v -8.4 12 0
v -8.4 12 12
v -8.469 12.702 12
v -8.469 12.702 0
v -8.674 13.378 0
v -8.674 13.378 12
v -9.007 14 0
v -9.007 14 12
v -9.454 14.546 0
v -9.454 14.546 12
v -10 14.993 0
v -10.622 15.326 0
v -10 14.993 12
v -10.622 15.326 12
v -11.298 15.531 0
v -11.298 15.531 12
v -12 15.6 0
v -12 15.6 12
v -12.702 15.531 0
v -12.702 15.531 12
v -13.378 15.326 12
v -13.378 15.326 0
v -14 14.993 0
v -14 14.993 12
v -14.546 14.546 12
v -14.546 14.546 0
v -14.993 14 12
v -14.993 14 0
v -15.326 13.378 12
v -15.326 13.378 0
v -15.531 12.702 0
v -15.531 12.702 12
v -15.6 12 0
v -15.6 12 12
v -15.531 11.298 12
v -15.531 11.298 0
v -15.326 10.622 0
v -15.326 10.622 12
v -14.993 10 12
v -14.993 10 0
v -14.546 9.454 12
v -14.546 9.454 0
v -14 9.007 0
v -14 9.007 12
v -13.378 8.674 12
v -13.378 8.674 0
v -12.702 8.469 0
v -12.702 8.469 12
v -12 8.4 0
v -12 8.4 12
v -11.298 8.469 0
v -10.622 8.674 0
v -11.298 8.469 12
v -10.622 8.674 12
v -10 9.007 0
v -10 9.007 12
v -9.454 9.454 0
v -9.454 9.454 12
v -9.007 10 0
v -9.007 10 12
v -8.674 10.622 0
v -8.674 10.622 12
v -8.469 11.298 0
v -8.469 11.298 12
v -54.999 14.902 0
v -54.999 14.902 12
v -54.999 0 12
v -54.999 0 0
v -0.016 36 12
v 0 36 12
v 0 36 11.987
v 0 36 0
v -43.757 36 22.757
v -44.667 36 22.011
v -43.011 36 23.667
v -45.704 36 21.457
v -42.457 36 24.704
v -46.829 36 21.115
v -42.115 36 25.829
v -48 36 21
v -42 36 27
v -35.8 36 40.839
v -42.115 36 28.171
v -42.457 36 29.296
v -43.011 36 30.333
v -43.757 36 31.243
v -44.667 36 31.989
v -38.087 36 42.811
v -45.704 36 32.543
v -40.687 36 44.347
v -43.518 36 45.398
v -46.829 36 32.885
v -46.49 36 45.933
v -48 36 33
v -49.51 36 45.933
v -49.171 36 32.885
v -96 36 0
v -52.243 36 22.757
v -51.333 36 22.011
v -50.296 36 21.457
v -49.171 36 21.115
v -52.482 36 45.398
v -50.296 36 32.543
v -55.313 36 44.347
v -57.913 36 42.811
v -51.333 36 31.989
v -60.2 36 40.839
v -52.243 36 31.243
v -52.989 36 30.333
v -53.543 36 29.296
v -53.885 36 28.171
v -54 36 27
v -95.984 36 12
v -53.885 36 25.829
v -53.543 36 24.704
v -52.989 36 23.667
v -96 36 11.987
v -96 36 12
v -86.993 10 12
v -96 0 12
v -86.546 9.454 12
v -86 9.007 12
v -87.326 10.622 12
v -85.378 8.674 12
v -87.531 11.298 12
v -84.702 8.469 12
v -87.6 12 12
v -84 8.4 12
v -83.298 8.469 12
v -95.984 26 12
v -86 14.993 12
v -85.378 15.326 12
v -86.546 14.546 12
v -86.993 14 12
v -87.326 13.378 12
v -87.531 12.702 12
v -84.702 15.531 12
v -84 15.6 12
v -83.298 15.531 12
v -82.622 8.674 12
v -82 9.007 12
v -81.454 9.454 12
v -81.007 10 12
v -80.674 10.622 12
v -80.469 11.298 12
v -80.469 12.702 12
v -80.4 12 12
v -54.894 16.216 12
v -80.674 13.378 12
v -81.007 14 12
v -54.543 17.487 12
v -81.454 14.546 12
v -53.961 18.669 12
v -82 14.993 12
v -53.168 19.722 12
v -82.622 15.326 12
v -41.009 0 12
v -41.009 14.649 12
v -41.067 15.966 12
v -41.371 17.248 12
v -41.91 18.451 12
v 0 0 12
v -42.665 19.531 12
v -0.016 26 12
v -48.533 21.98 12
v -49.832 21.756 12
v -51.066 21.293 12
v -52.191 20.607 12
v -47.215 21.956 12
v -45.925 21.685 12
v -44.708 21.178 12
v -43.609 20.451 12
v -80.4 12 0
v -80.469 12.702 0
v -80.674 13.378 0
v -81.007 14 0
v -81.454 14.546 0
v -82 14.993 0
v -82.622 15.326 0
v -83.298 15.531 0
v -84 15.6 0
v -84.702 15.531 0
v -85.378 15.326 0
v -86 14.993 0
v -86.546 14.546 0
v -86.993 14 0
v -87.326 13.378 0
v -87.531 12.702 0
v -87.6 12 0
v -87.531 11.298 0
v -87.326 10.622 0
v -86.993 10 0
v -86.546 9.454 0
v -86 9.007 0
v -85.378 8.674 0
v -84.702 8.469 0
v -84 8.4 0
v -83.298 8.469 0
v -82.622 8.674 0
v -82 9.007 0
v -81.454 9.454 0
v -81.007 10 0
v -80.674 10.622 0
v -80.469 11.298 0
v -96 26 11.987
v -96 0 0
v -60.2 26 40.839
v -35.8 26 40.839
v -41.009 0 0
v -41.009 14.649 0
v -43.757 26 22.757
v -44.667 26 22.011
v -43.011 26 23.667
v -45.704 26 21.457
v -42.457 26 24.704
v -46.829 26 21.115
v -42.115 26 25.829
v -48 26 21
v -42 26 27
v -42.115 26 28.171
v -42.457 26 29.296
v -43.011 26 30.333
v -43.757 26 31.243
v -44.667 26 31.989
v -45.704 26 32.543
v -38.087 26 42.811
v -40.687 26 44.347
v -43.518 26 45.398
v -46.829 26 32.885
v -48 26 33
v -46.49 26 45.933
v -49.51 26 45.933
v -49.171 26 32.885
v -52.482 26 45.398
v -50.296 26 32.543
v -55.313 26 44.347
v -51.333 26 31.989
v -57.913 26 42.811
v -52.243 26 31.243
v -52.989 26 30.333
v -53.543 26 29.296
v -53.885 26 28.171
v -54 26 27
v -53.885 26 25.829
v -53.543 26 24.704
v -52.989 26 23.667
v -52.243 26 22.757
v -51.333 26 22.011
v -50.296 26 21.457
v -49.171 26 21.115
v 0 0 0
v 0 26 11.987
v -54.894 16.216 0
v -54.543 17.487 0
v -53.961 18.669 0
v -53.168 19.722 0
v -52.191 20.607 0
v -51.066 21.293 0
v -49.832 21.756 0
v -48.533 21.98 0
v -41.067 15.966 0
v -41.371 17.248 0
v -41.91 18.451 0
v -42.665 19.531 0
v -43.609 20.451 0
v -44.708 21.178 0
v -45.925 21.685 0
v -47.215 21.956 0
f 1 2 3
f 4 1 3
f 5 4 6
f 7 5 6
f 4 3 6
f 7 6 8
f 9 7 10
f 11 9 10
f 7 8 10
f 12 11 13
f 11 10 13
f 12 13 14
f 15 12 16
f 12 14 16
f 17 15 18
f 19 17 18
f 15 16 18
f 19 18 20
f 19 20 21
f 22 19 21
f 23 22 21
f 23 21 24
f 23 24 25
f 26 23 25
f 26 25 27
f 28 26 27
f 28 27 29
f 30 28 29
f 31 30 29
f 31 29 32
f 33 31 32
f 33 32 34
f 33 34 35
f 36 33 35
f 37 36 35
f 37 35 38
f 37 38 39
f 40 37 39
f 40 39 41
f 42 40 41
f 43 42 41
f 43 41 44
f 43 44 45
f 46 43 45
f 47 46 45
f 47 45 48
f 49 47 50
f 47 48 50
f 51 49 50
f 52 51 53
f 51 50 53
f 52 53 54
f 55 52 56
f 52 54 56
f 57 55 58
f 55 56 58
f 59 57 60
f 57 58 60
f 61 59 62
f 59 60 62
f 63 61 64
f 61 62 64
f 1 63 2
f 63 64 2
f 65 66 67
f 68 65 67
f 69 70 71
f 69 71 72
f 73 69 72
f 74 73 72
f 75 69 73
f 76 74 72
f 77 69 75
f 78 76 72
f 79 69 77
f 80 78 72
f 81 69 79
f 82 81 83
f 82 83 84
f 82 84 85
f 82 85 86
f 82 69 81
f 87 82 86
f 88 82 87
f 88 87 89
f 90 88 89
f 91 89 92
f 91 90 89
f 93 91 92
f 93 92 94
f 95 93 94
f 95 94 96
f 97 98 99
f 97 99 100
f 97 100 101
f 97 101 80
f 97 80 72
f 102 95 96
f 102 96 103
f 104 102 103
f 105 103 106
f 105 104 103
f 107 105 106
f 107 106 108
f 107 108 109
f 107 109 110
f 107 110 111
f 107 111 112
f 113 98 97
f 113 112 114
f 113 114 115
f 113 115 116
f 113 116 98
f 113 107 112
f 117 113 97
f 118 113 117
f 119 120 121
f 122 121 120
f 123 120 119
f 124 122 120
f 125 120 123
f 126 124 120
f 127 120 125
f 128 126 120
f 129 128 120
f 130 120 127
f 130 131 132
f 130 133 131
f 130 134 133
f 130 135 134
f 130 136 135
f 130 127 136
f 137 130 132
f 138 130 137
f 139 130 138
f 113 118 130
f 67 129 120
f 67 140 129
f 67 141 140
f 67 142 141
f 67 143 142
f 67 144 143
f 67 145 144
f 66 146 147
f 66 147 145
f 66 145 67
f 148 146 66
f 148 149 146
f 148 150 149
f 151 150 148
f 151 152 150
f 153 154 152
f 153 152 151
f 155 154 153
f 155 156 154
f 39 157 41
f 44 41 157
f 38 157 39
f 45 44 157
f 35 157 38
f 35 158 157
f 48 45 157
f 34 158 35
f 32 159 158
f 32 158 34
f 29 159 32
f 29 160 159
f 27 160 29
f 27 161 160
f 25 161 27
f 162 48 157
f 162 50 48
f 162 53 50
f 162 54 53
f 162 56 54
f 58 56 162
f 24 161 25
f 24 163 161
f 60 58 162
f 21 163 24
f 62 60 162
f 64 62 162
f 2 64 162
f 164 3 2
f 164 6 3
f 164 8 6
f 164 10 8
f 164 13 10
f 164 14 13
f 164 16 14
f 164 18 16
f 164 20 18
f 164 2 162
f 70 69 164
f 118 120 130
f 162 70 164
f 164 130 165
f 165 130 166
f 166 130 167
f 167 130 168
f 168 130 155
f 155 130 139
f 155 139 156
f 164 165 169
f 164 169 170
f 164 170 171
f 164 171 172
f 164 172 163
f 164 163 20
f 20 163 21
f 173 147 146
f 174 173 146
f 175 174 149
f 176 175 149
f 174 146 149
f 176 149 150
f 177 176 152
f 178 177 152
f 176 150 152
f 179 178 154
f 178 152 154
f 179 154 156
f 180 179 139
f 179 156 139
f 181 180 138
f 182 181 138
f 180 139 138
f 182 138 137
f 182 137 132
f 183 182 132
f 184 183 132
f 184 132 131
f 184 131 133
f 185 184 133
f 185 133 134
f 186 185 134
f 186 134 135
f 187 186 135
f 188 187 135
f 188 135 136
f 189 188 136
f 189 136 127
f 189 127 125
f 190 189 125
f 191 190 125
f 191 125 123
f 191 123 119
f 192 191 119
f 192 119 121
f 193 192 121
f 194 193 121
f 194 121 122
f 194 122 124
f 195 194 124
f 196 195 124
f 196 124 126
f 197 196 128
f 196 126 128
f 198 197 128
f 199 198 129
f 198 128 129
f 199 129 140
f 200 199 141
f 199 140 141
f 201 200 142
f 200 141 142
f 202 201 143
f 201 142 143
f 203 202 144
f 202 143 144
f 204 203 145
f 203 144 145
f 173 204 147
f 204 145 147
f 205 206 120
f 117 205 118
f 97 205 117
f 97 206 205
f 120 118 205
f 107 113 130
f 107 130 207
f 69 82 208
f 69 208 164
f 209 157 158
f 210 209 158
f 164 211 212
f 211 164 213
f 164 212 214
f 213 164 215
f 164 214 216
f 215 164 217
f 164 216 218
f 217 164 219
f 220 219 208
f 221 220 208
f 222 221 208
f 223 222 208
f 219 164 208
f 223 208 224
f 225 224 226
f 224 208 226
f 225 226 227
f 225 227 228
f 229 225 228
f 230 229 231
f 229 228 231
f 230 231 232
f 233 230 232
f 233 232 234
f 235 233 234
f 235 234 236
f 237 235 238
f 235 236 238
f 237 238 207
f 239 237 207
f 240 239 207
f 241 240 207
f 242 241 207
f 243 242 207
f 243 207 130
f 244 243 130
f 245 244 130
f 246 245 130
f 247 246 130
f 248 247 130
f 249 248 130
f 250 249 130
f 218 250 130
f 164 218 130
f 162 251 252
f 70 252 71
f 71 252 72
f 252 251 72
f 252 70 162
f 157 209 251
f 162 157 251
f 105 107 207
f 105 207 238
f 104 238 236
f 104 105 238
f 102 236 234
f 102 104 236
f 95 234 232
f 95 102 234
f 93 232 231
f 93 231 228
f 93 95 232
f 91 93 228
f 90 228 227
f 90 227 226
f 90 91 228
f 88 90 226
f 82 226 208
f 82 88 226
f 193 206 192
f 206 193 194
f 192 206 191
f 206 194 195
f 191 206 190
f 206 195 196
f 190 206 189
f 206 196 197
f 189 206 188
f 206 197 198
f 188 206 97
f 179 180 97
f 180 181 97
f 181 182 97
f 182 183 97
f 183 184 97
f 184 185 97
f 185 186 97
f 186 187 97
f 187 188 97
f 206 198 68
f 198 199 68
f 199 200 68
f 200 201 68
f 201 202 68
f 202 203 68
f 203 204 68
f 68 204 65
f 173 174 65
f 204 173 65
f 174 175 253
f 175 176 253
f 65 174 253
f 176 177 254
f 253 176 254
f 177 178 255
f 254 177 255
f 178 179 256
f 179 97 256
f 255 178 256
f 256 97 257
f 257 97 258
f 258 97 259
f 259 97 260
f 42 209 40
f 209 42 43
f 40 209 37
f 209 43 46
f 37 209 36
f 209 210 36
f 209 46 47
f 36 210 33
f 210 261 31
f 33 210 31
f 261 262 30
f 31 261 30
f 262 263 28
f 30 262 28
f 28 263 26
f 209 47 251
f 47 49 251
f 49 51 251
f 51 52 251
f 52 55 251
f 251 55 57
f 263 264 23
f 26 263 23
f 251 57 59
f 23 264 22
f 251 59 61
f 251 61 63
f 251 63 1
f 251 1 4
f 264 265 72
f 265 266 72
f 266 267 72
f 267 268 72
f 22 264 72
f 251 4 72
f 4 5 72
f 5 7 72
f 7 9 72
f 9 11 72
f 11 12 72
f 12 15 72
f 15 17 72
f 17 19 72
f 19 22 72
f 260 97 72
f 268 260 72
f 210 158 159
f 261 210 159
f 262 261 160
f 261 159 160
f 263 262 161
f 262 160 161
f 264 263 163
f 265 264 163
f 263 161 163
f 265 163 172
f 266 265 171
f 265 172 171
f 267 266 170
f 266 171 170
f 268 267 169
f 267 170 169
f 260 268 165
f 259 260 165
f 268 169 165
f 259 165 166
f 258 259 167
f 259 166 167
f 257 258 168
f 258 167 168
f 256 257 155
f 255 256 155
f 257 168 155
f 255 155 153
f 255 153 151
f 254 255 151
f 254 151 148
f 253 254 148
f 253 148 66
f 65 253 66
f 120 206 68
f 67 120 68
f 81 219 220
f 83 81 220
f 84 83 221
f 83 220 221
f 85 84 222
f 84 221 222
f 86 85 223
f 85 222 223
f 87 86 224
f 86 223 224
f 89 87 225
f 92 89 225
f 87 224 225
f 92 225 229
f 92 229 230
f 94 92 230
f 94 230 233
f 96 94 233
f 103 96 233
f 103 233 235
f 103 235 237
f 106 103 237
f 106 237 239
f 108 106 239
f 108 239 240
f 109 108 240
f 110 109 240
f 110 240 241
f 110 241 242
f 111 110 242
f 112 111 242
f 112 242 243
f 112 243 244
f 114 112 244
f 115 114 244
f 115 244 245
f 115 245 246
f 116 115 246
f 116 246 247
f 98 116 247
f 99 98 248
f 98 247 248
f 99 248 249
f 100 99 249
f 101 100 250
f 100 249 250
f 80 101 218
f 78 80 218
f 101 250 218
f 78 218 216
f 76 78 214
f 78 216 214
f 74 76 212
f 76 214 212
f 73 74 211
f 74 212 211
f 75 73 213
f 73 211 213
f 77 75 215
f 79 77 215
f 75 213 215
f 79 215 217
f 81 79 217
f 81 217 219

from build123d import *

# Parameters (mm, degrees)
F0_W      = 96
F0_H      = 36
F1_DEPTH  = 12
F2_R      = 3.6
F3_DEPTH  = 12.001
F5_DEPTH  = 12.001
F8_DEPTH  = 10
F9_R      = 6
F10_DEPTH = 10.001


with BuildPart() as f1:
    # F0 (on Top) → F1 (new body)
    with BuildSketch(Plane.XY):
        with Locations((-48, 18)):
            Rectangle(F0_W, F0_H)
    extrude(amount=F1_DEPTH)

    # F2 (on face) → F3 (cut, through all)
    with BuildSketch(Plane.XY.offset(12)):
        with Locations((-12, 12)):
            Circle(F2_R)
        with Locations((-84, 12)):
            Circle(F2_R)
    extrude(amount=-F3_DEPTH, mode=Mode.SUBTRACT)

    # F4 (on face) → F5 (cut, through all)
    with BuildSketch(Plane.XY.offset(12)):
        with BuildLine():
            Line((-41.0088156365, -1.4656213384), (-41.0088156365, 14.6488003482))
            ThreePointArc((-41.0088156365, 14.6488003482), (-47.8732599834, 21.9988525465), (-54.9993160638, 14.9021499143))
            Line((-54.9993160638, 14.9021499143), (-54.9993160638, -1.4656213384))
            Line((-54.9993160638, -1.4656213384), (-41.0088156365, -1.4656213384))
        make_face()
    extrude(amount=-F5_DEPTH, mode=Mode.SUBTRACT)

    # F7 (on offset) → F8 (join)
    with BuildSketch(Plane(origin=(0, 36, 0), x_dir=(-1, 0, 0), z_dir=(0, 1, 0))):
        with BuildLine():
            Line((35.7998133379, 40.8387265113), (0, 11.9867287576))
            Line((0, 11.9867287576), (96, 11.9867287576))
            Line((96, 11.9867287576), (60.2001866621, 40.8387265113))
            ThreePointArc((60.2001866621, 40.8387265113), (48, 46), (35.7998133379, 40.8387265113))
        make_face()
    extrude(amount=-F8_DEPTH)

    # F9 (on face) → F10 (cut, through all)
    with BuildSketch(Plane.XZ.offset(-26)):
        with Locations((-48, 27)):
            Circle(F9_R)
    extrude(amount=-F10_DEPTH, mode=Mode.SUBTRACT)


solid = f1.part
